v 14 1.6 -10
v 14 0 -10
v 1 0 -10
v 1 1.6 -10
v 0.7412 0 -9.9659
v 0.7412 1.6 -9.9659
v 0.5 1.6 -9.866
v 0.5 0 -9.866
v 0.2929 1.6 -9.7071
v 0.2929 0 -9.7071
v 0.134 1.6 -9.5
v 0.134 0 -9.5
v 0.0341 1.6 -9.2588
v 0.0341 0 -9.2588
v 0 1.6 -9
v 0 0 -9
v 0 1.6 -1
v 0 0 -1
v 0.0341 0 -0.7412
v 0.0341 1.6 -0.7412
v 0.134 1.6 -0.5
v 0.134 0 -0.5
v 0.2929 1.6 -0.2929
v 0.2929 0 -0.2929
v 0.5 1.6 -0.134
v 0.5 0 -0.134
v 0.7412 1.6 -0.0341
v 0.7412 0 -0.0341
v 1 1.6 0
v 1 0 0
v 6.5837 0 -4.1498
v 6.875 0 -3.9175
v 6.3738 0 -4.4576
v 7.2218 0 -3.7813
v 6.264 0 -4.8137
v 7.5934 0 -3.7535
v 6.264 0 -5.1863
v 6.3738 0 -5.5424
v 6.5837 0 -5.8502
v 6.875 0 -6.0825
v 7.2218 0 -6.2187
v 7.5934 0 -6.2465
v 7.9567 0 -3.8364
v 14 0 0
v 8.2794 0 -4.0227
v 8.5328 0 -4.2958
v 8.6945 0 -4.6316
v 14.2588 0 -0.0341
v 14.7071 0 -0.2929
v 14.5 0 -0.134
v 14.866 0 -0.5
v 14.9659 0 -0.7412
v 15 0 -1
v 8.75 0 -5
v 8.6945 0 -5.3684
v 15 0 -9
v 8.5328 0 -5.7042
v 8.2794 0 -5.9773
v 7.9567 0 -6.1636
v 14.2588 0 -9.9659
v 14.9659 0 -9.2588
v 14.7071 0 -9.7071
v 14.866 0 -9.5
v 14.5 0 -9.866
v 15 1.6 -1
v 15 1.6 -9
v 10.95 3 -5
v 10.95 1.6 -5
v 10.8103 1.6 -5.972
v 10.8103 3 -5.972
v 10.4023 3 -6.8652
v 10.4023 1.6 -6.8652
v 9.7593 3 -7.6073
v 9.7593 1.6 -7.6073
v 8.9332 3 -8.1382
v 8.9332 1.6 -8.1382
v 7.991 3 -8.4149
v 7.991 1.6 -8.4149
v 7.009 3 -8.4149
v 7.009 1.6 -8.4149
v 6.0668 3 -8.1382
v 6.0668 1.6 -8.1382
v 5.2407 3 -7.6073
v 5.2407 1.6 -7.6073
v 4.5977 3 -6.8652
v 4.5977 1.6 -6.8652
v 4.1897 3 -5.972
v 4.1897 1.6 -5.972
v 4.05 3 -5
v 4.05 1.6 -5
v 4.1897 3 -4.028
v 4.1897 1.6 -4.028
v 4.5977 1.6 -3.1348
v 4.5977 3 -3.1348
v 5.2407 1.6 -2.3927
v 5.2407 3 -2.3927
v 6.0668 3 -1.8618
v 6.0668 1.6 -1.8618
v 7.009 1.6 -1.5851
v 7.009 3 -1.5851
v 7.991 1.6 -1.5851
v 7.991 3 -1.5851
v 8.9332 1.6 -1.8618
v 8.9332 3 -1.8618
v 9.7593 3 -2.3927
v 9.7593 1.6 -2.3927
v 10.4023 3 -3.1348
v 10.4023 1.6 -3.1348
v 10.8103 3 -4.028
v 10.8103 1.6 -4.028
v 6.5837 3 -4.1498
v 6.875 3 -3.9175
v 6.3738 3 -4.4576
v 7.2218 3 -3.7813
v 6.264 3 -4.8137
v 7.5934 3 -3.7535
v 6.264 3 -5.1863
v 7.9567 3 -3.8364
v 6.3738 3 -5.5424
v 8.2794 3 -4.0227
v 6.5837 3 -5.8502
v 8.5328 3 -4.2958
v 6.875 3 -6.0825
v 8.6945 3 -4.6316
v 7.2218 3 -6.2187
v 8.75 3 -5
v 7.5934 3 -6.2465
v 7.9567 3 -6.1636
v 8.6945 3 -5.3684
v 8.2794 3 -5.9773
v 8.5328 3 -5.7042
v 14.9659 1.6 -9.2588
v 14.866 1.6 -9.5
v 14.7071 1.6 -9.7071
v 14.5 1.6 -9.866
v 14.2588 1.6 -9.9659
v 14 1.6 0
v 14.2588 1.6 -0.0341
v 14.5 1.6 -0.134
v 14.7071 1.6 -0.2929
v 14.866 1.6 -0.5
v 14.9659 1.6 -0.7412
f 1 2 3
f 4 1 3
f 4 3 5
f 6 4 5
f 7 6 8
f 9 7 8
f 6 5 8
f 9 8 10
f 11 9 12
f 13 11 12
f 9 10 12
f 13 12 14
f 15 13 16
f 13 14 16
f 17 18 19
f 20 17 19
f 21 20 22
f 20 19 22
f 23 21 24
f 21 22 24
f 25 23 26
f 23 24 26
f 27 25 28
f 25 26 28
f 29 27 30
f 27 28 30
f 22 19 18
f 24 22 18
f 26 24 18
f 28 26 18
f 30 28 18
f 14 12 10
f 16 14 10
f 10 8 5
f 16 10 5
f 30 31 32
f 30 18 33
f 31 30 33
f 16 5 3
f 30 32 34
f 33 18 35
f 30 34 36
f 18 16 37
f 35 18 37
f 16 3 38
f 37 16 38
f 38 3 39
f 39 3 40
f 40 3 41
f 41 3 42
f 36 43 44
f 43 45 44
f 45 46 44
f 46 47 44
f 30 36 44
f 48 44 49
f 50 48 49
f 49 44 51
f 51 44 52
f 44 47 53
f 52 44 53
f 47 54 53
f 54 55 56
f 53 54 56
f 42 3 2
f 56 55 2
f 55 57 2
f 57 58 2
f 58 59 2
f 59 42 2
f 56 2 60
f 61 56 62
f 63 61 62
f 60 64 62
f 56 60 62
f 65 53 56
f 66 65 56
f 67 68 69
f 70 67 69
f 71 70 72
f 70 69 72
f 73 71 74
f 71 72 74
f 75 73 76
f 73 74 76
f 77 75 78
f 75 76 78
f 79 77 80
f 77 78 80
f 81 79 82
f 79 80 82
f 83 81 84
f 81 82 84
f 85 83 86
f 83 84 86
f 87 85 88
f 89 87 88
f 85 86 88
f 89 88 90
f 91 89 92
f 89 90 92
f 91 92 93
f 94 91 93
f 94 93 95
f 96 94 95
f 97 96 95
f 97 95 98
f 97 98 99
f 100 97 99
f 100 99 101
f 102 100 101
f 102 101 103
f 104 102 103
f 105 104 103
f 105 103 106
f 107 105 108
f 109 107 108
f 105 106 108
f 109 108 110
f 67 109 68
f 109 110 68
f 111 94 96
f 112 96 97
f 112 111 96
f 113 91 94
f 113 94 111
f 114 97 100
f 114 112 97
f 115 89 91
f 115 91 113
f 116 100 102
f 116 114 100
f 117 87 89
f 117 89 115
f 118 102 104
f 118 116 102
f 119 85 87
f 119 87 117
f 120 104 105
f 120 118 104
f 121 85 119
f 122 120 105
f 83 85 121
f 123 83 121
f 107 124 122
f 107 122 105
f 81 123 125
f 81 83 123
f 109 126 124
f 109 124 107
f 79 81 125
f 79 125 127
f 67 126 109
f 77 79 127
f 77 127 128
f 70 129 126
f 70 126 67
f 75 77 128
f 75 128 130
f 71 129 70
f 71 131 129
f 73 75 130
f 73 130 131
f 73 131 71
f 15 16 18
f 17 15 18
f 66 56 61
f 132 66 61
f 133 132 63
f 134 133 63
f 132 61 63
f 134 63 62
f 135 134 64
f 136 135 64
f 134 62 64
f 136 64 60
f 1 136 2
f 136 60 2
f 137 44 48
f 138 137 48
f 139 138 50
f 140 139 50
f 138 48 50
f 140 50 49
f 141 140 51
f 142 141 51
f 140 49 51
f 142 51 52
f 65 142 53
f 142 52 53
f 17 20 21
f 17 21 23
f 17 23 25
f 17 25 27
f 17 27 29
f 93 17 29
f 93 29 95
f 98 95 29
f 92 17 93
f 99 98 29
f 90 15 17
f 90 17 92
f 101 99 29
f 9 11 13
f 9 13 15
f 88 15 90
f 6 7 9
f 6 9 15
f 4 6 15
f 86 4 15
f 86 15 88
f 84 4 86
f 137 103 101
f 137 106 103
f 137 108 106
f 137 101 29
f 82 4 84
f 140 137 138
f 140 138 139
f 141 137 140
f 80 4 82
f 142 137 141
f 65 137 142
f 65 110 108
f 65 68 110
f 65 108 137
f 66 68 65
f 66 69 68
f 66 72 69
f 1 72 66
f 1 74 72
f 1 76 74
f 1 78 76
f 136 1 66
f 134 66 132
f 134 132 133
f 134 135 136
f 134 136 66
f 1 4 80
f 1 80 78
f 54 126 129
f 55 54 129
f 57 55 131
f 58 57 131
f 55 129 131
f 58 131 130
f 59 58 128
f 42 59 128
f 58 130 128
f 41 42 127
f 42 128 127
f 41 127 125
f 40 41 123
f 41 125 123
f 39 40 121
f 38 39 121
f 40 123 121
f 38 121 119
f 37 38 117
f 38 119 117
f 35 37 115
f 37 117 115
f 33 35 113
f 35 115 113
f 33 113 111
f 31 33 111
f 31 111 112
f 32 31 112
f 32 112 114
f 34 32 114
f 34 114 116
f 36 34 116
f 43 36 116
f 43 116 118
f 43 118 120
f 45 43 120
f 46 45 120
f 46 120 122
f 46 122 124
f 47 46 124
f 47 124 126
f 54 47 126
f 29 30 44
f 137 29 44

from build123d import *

# Parameters (mm, degrees)
SALIENTE_EXTRUIR1_DEPTH = 1.6
CROQUIS2_R              = 3.45
SALIENTE_EXTRUIR2_DEPTH = 1.4
CORTAR_EXTRUIR1_REACH   = 5
CROQUIS3_R              = 1.25


with BuildPart() as part:
    # Croquis1 → Saliente-Extruir1 (new body)
    with BuildSketch(Plane(origin=(0, 0, 0), x_dir=(1, 0, 0), z_dir=(0, 1, 0))):
        with BuildLine():
            Line((1, 0), (14, 0))
            ThreePointArc((14, 0), (14.707106781, 0.292893219), (15, 1))
            Line((15, 1), (15, 9))
            ThreePointArc((15, 9), (14.707106781, 9.707106781), (14, 10))
            Line((14, 10), (1, 10))
            ThreePointArc((1, 10), (0.292893219, 9.707106781), (0, 9))
            Line((0, 9), (0, 1))
            ThreePointArc((0, 1), (0.292893219, 0.292893219), (1, 0))
        make_face()
    extrude(amount=SALIENTE_EXTRUIR1_DEPTH)

    # Croquis2 → Saliente-Extruir2 (add)
    with BuildSketch(Plane(origin=(0, 1.6, 0), x_dir=(1, 0, 0), z_dir=(0, 1, 0))):
        with Locations((7.5, 5)):
            Circle(CROQUIS2_R)
    extrude(amount=SALIENTE_EXTRUIR2_DEPTH)

    # Croquis3 → Cortar-Extruir1 (cut, up to next)
    with BuildSketch(Plane(origin=(0, 3, 0), x_dir=(1, 0, 0), z_dir=(0, 1, 0)), mode=Mode.PRIVATE) as cortar_extruir1_sk1:
        with Locations((7.5, 5)):
            Circle(CROQUIS3_R)
    cortar_extruir1_tool1 = extrude(cortar_extruir1_sk1.sketch, amount=-CORTAR_EXTRUIR1_REACH, mode=Mode.PRIVATE) & part.part
    add(cortar_extruir1_tool1.solids().sort_by_distance((7.5, 3, -5))[0], mode=Mode.SUBTRACT)


solid = part.part
